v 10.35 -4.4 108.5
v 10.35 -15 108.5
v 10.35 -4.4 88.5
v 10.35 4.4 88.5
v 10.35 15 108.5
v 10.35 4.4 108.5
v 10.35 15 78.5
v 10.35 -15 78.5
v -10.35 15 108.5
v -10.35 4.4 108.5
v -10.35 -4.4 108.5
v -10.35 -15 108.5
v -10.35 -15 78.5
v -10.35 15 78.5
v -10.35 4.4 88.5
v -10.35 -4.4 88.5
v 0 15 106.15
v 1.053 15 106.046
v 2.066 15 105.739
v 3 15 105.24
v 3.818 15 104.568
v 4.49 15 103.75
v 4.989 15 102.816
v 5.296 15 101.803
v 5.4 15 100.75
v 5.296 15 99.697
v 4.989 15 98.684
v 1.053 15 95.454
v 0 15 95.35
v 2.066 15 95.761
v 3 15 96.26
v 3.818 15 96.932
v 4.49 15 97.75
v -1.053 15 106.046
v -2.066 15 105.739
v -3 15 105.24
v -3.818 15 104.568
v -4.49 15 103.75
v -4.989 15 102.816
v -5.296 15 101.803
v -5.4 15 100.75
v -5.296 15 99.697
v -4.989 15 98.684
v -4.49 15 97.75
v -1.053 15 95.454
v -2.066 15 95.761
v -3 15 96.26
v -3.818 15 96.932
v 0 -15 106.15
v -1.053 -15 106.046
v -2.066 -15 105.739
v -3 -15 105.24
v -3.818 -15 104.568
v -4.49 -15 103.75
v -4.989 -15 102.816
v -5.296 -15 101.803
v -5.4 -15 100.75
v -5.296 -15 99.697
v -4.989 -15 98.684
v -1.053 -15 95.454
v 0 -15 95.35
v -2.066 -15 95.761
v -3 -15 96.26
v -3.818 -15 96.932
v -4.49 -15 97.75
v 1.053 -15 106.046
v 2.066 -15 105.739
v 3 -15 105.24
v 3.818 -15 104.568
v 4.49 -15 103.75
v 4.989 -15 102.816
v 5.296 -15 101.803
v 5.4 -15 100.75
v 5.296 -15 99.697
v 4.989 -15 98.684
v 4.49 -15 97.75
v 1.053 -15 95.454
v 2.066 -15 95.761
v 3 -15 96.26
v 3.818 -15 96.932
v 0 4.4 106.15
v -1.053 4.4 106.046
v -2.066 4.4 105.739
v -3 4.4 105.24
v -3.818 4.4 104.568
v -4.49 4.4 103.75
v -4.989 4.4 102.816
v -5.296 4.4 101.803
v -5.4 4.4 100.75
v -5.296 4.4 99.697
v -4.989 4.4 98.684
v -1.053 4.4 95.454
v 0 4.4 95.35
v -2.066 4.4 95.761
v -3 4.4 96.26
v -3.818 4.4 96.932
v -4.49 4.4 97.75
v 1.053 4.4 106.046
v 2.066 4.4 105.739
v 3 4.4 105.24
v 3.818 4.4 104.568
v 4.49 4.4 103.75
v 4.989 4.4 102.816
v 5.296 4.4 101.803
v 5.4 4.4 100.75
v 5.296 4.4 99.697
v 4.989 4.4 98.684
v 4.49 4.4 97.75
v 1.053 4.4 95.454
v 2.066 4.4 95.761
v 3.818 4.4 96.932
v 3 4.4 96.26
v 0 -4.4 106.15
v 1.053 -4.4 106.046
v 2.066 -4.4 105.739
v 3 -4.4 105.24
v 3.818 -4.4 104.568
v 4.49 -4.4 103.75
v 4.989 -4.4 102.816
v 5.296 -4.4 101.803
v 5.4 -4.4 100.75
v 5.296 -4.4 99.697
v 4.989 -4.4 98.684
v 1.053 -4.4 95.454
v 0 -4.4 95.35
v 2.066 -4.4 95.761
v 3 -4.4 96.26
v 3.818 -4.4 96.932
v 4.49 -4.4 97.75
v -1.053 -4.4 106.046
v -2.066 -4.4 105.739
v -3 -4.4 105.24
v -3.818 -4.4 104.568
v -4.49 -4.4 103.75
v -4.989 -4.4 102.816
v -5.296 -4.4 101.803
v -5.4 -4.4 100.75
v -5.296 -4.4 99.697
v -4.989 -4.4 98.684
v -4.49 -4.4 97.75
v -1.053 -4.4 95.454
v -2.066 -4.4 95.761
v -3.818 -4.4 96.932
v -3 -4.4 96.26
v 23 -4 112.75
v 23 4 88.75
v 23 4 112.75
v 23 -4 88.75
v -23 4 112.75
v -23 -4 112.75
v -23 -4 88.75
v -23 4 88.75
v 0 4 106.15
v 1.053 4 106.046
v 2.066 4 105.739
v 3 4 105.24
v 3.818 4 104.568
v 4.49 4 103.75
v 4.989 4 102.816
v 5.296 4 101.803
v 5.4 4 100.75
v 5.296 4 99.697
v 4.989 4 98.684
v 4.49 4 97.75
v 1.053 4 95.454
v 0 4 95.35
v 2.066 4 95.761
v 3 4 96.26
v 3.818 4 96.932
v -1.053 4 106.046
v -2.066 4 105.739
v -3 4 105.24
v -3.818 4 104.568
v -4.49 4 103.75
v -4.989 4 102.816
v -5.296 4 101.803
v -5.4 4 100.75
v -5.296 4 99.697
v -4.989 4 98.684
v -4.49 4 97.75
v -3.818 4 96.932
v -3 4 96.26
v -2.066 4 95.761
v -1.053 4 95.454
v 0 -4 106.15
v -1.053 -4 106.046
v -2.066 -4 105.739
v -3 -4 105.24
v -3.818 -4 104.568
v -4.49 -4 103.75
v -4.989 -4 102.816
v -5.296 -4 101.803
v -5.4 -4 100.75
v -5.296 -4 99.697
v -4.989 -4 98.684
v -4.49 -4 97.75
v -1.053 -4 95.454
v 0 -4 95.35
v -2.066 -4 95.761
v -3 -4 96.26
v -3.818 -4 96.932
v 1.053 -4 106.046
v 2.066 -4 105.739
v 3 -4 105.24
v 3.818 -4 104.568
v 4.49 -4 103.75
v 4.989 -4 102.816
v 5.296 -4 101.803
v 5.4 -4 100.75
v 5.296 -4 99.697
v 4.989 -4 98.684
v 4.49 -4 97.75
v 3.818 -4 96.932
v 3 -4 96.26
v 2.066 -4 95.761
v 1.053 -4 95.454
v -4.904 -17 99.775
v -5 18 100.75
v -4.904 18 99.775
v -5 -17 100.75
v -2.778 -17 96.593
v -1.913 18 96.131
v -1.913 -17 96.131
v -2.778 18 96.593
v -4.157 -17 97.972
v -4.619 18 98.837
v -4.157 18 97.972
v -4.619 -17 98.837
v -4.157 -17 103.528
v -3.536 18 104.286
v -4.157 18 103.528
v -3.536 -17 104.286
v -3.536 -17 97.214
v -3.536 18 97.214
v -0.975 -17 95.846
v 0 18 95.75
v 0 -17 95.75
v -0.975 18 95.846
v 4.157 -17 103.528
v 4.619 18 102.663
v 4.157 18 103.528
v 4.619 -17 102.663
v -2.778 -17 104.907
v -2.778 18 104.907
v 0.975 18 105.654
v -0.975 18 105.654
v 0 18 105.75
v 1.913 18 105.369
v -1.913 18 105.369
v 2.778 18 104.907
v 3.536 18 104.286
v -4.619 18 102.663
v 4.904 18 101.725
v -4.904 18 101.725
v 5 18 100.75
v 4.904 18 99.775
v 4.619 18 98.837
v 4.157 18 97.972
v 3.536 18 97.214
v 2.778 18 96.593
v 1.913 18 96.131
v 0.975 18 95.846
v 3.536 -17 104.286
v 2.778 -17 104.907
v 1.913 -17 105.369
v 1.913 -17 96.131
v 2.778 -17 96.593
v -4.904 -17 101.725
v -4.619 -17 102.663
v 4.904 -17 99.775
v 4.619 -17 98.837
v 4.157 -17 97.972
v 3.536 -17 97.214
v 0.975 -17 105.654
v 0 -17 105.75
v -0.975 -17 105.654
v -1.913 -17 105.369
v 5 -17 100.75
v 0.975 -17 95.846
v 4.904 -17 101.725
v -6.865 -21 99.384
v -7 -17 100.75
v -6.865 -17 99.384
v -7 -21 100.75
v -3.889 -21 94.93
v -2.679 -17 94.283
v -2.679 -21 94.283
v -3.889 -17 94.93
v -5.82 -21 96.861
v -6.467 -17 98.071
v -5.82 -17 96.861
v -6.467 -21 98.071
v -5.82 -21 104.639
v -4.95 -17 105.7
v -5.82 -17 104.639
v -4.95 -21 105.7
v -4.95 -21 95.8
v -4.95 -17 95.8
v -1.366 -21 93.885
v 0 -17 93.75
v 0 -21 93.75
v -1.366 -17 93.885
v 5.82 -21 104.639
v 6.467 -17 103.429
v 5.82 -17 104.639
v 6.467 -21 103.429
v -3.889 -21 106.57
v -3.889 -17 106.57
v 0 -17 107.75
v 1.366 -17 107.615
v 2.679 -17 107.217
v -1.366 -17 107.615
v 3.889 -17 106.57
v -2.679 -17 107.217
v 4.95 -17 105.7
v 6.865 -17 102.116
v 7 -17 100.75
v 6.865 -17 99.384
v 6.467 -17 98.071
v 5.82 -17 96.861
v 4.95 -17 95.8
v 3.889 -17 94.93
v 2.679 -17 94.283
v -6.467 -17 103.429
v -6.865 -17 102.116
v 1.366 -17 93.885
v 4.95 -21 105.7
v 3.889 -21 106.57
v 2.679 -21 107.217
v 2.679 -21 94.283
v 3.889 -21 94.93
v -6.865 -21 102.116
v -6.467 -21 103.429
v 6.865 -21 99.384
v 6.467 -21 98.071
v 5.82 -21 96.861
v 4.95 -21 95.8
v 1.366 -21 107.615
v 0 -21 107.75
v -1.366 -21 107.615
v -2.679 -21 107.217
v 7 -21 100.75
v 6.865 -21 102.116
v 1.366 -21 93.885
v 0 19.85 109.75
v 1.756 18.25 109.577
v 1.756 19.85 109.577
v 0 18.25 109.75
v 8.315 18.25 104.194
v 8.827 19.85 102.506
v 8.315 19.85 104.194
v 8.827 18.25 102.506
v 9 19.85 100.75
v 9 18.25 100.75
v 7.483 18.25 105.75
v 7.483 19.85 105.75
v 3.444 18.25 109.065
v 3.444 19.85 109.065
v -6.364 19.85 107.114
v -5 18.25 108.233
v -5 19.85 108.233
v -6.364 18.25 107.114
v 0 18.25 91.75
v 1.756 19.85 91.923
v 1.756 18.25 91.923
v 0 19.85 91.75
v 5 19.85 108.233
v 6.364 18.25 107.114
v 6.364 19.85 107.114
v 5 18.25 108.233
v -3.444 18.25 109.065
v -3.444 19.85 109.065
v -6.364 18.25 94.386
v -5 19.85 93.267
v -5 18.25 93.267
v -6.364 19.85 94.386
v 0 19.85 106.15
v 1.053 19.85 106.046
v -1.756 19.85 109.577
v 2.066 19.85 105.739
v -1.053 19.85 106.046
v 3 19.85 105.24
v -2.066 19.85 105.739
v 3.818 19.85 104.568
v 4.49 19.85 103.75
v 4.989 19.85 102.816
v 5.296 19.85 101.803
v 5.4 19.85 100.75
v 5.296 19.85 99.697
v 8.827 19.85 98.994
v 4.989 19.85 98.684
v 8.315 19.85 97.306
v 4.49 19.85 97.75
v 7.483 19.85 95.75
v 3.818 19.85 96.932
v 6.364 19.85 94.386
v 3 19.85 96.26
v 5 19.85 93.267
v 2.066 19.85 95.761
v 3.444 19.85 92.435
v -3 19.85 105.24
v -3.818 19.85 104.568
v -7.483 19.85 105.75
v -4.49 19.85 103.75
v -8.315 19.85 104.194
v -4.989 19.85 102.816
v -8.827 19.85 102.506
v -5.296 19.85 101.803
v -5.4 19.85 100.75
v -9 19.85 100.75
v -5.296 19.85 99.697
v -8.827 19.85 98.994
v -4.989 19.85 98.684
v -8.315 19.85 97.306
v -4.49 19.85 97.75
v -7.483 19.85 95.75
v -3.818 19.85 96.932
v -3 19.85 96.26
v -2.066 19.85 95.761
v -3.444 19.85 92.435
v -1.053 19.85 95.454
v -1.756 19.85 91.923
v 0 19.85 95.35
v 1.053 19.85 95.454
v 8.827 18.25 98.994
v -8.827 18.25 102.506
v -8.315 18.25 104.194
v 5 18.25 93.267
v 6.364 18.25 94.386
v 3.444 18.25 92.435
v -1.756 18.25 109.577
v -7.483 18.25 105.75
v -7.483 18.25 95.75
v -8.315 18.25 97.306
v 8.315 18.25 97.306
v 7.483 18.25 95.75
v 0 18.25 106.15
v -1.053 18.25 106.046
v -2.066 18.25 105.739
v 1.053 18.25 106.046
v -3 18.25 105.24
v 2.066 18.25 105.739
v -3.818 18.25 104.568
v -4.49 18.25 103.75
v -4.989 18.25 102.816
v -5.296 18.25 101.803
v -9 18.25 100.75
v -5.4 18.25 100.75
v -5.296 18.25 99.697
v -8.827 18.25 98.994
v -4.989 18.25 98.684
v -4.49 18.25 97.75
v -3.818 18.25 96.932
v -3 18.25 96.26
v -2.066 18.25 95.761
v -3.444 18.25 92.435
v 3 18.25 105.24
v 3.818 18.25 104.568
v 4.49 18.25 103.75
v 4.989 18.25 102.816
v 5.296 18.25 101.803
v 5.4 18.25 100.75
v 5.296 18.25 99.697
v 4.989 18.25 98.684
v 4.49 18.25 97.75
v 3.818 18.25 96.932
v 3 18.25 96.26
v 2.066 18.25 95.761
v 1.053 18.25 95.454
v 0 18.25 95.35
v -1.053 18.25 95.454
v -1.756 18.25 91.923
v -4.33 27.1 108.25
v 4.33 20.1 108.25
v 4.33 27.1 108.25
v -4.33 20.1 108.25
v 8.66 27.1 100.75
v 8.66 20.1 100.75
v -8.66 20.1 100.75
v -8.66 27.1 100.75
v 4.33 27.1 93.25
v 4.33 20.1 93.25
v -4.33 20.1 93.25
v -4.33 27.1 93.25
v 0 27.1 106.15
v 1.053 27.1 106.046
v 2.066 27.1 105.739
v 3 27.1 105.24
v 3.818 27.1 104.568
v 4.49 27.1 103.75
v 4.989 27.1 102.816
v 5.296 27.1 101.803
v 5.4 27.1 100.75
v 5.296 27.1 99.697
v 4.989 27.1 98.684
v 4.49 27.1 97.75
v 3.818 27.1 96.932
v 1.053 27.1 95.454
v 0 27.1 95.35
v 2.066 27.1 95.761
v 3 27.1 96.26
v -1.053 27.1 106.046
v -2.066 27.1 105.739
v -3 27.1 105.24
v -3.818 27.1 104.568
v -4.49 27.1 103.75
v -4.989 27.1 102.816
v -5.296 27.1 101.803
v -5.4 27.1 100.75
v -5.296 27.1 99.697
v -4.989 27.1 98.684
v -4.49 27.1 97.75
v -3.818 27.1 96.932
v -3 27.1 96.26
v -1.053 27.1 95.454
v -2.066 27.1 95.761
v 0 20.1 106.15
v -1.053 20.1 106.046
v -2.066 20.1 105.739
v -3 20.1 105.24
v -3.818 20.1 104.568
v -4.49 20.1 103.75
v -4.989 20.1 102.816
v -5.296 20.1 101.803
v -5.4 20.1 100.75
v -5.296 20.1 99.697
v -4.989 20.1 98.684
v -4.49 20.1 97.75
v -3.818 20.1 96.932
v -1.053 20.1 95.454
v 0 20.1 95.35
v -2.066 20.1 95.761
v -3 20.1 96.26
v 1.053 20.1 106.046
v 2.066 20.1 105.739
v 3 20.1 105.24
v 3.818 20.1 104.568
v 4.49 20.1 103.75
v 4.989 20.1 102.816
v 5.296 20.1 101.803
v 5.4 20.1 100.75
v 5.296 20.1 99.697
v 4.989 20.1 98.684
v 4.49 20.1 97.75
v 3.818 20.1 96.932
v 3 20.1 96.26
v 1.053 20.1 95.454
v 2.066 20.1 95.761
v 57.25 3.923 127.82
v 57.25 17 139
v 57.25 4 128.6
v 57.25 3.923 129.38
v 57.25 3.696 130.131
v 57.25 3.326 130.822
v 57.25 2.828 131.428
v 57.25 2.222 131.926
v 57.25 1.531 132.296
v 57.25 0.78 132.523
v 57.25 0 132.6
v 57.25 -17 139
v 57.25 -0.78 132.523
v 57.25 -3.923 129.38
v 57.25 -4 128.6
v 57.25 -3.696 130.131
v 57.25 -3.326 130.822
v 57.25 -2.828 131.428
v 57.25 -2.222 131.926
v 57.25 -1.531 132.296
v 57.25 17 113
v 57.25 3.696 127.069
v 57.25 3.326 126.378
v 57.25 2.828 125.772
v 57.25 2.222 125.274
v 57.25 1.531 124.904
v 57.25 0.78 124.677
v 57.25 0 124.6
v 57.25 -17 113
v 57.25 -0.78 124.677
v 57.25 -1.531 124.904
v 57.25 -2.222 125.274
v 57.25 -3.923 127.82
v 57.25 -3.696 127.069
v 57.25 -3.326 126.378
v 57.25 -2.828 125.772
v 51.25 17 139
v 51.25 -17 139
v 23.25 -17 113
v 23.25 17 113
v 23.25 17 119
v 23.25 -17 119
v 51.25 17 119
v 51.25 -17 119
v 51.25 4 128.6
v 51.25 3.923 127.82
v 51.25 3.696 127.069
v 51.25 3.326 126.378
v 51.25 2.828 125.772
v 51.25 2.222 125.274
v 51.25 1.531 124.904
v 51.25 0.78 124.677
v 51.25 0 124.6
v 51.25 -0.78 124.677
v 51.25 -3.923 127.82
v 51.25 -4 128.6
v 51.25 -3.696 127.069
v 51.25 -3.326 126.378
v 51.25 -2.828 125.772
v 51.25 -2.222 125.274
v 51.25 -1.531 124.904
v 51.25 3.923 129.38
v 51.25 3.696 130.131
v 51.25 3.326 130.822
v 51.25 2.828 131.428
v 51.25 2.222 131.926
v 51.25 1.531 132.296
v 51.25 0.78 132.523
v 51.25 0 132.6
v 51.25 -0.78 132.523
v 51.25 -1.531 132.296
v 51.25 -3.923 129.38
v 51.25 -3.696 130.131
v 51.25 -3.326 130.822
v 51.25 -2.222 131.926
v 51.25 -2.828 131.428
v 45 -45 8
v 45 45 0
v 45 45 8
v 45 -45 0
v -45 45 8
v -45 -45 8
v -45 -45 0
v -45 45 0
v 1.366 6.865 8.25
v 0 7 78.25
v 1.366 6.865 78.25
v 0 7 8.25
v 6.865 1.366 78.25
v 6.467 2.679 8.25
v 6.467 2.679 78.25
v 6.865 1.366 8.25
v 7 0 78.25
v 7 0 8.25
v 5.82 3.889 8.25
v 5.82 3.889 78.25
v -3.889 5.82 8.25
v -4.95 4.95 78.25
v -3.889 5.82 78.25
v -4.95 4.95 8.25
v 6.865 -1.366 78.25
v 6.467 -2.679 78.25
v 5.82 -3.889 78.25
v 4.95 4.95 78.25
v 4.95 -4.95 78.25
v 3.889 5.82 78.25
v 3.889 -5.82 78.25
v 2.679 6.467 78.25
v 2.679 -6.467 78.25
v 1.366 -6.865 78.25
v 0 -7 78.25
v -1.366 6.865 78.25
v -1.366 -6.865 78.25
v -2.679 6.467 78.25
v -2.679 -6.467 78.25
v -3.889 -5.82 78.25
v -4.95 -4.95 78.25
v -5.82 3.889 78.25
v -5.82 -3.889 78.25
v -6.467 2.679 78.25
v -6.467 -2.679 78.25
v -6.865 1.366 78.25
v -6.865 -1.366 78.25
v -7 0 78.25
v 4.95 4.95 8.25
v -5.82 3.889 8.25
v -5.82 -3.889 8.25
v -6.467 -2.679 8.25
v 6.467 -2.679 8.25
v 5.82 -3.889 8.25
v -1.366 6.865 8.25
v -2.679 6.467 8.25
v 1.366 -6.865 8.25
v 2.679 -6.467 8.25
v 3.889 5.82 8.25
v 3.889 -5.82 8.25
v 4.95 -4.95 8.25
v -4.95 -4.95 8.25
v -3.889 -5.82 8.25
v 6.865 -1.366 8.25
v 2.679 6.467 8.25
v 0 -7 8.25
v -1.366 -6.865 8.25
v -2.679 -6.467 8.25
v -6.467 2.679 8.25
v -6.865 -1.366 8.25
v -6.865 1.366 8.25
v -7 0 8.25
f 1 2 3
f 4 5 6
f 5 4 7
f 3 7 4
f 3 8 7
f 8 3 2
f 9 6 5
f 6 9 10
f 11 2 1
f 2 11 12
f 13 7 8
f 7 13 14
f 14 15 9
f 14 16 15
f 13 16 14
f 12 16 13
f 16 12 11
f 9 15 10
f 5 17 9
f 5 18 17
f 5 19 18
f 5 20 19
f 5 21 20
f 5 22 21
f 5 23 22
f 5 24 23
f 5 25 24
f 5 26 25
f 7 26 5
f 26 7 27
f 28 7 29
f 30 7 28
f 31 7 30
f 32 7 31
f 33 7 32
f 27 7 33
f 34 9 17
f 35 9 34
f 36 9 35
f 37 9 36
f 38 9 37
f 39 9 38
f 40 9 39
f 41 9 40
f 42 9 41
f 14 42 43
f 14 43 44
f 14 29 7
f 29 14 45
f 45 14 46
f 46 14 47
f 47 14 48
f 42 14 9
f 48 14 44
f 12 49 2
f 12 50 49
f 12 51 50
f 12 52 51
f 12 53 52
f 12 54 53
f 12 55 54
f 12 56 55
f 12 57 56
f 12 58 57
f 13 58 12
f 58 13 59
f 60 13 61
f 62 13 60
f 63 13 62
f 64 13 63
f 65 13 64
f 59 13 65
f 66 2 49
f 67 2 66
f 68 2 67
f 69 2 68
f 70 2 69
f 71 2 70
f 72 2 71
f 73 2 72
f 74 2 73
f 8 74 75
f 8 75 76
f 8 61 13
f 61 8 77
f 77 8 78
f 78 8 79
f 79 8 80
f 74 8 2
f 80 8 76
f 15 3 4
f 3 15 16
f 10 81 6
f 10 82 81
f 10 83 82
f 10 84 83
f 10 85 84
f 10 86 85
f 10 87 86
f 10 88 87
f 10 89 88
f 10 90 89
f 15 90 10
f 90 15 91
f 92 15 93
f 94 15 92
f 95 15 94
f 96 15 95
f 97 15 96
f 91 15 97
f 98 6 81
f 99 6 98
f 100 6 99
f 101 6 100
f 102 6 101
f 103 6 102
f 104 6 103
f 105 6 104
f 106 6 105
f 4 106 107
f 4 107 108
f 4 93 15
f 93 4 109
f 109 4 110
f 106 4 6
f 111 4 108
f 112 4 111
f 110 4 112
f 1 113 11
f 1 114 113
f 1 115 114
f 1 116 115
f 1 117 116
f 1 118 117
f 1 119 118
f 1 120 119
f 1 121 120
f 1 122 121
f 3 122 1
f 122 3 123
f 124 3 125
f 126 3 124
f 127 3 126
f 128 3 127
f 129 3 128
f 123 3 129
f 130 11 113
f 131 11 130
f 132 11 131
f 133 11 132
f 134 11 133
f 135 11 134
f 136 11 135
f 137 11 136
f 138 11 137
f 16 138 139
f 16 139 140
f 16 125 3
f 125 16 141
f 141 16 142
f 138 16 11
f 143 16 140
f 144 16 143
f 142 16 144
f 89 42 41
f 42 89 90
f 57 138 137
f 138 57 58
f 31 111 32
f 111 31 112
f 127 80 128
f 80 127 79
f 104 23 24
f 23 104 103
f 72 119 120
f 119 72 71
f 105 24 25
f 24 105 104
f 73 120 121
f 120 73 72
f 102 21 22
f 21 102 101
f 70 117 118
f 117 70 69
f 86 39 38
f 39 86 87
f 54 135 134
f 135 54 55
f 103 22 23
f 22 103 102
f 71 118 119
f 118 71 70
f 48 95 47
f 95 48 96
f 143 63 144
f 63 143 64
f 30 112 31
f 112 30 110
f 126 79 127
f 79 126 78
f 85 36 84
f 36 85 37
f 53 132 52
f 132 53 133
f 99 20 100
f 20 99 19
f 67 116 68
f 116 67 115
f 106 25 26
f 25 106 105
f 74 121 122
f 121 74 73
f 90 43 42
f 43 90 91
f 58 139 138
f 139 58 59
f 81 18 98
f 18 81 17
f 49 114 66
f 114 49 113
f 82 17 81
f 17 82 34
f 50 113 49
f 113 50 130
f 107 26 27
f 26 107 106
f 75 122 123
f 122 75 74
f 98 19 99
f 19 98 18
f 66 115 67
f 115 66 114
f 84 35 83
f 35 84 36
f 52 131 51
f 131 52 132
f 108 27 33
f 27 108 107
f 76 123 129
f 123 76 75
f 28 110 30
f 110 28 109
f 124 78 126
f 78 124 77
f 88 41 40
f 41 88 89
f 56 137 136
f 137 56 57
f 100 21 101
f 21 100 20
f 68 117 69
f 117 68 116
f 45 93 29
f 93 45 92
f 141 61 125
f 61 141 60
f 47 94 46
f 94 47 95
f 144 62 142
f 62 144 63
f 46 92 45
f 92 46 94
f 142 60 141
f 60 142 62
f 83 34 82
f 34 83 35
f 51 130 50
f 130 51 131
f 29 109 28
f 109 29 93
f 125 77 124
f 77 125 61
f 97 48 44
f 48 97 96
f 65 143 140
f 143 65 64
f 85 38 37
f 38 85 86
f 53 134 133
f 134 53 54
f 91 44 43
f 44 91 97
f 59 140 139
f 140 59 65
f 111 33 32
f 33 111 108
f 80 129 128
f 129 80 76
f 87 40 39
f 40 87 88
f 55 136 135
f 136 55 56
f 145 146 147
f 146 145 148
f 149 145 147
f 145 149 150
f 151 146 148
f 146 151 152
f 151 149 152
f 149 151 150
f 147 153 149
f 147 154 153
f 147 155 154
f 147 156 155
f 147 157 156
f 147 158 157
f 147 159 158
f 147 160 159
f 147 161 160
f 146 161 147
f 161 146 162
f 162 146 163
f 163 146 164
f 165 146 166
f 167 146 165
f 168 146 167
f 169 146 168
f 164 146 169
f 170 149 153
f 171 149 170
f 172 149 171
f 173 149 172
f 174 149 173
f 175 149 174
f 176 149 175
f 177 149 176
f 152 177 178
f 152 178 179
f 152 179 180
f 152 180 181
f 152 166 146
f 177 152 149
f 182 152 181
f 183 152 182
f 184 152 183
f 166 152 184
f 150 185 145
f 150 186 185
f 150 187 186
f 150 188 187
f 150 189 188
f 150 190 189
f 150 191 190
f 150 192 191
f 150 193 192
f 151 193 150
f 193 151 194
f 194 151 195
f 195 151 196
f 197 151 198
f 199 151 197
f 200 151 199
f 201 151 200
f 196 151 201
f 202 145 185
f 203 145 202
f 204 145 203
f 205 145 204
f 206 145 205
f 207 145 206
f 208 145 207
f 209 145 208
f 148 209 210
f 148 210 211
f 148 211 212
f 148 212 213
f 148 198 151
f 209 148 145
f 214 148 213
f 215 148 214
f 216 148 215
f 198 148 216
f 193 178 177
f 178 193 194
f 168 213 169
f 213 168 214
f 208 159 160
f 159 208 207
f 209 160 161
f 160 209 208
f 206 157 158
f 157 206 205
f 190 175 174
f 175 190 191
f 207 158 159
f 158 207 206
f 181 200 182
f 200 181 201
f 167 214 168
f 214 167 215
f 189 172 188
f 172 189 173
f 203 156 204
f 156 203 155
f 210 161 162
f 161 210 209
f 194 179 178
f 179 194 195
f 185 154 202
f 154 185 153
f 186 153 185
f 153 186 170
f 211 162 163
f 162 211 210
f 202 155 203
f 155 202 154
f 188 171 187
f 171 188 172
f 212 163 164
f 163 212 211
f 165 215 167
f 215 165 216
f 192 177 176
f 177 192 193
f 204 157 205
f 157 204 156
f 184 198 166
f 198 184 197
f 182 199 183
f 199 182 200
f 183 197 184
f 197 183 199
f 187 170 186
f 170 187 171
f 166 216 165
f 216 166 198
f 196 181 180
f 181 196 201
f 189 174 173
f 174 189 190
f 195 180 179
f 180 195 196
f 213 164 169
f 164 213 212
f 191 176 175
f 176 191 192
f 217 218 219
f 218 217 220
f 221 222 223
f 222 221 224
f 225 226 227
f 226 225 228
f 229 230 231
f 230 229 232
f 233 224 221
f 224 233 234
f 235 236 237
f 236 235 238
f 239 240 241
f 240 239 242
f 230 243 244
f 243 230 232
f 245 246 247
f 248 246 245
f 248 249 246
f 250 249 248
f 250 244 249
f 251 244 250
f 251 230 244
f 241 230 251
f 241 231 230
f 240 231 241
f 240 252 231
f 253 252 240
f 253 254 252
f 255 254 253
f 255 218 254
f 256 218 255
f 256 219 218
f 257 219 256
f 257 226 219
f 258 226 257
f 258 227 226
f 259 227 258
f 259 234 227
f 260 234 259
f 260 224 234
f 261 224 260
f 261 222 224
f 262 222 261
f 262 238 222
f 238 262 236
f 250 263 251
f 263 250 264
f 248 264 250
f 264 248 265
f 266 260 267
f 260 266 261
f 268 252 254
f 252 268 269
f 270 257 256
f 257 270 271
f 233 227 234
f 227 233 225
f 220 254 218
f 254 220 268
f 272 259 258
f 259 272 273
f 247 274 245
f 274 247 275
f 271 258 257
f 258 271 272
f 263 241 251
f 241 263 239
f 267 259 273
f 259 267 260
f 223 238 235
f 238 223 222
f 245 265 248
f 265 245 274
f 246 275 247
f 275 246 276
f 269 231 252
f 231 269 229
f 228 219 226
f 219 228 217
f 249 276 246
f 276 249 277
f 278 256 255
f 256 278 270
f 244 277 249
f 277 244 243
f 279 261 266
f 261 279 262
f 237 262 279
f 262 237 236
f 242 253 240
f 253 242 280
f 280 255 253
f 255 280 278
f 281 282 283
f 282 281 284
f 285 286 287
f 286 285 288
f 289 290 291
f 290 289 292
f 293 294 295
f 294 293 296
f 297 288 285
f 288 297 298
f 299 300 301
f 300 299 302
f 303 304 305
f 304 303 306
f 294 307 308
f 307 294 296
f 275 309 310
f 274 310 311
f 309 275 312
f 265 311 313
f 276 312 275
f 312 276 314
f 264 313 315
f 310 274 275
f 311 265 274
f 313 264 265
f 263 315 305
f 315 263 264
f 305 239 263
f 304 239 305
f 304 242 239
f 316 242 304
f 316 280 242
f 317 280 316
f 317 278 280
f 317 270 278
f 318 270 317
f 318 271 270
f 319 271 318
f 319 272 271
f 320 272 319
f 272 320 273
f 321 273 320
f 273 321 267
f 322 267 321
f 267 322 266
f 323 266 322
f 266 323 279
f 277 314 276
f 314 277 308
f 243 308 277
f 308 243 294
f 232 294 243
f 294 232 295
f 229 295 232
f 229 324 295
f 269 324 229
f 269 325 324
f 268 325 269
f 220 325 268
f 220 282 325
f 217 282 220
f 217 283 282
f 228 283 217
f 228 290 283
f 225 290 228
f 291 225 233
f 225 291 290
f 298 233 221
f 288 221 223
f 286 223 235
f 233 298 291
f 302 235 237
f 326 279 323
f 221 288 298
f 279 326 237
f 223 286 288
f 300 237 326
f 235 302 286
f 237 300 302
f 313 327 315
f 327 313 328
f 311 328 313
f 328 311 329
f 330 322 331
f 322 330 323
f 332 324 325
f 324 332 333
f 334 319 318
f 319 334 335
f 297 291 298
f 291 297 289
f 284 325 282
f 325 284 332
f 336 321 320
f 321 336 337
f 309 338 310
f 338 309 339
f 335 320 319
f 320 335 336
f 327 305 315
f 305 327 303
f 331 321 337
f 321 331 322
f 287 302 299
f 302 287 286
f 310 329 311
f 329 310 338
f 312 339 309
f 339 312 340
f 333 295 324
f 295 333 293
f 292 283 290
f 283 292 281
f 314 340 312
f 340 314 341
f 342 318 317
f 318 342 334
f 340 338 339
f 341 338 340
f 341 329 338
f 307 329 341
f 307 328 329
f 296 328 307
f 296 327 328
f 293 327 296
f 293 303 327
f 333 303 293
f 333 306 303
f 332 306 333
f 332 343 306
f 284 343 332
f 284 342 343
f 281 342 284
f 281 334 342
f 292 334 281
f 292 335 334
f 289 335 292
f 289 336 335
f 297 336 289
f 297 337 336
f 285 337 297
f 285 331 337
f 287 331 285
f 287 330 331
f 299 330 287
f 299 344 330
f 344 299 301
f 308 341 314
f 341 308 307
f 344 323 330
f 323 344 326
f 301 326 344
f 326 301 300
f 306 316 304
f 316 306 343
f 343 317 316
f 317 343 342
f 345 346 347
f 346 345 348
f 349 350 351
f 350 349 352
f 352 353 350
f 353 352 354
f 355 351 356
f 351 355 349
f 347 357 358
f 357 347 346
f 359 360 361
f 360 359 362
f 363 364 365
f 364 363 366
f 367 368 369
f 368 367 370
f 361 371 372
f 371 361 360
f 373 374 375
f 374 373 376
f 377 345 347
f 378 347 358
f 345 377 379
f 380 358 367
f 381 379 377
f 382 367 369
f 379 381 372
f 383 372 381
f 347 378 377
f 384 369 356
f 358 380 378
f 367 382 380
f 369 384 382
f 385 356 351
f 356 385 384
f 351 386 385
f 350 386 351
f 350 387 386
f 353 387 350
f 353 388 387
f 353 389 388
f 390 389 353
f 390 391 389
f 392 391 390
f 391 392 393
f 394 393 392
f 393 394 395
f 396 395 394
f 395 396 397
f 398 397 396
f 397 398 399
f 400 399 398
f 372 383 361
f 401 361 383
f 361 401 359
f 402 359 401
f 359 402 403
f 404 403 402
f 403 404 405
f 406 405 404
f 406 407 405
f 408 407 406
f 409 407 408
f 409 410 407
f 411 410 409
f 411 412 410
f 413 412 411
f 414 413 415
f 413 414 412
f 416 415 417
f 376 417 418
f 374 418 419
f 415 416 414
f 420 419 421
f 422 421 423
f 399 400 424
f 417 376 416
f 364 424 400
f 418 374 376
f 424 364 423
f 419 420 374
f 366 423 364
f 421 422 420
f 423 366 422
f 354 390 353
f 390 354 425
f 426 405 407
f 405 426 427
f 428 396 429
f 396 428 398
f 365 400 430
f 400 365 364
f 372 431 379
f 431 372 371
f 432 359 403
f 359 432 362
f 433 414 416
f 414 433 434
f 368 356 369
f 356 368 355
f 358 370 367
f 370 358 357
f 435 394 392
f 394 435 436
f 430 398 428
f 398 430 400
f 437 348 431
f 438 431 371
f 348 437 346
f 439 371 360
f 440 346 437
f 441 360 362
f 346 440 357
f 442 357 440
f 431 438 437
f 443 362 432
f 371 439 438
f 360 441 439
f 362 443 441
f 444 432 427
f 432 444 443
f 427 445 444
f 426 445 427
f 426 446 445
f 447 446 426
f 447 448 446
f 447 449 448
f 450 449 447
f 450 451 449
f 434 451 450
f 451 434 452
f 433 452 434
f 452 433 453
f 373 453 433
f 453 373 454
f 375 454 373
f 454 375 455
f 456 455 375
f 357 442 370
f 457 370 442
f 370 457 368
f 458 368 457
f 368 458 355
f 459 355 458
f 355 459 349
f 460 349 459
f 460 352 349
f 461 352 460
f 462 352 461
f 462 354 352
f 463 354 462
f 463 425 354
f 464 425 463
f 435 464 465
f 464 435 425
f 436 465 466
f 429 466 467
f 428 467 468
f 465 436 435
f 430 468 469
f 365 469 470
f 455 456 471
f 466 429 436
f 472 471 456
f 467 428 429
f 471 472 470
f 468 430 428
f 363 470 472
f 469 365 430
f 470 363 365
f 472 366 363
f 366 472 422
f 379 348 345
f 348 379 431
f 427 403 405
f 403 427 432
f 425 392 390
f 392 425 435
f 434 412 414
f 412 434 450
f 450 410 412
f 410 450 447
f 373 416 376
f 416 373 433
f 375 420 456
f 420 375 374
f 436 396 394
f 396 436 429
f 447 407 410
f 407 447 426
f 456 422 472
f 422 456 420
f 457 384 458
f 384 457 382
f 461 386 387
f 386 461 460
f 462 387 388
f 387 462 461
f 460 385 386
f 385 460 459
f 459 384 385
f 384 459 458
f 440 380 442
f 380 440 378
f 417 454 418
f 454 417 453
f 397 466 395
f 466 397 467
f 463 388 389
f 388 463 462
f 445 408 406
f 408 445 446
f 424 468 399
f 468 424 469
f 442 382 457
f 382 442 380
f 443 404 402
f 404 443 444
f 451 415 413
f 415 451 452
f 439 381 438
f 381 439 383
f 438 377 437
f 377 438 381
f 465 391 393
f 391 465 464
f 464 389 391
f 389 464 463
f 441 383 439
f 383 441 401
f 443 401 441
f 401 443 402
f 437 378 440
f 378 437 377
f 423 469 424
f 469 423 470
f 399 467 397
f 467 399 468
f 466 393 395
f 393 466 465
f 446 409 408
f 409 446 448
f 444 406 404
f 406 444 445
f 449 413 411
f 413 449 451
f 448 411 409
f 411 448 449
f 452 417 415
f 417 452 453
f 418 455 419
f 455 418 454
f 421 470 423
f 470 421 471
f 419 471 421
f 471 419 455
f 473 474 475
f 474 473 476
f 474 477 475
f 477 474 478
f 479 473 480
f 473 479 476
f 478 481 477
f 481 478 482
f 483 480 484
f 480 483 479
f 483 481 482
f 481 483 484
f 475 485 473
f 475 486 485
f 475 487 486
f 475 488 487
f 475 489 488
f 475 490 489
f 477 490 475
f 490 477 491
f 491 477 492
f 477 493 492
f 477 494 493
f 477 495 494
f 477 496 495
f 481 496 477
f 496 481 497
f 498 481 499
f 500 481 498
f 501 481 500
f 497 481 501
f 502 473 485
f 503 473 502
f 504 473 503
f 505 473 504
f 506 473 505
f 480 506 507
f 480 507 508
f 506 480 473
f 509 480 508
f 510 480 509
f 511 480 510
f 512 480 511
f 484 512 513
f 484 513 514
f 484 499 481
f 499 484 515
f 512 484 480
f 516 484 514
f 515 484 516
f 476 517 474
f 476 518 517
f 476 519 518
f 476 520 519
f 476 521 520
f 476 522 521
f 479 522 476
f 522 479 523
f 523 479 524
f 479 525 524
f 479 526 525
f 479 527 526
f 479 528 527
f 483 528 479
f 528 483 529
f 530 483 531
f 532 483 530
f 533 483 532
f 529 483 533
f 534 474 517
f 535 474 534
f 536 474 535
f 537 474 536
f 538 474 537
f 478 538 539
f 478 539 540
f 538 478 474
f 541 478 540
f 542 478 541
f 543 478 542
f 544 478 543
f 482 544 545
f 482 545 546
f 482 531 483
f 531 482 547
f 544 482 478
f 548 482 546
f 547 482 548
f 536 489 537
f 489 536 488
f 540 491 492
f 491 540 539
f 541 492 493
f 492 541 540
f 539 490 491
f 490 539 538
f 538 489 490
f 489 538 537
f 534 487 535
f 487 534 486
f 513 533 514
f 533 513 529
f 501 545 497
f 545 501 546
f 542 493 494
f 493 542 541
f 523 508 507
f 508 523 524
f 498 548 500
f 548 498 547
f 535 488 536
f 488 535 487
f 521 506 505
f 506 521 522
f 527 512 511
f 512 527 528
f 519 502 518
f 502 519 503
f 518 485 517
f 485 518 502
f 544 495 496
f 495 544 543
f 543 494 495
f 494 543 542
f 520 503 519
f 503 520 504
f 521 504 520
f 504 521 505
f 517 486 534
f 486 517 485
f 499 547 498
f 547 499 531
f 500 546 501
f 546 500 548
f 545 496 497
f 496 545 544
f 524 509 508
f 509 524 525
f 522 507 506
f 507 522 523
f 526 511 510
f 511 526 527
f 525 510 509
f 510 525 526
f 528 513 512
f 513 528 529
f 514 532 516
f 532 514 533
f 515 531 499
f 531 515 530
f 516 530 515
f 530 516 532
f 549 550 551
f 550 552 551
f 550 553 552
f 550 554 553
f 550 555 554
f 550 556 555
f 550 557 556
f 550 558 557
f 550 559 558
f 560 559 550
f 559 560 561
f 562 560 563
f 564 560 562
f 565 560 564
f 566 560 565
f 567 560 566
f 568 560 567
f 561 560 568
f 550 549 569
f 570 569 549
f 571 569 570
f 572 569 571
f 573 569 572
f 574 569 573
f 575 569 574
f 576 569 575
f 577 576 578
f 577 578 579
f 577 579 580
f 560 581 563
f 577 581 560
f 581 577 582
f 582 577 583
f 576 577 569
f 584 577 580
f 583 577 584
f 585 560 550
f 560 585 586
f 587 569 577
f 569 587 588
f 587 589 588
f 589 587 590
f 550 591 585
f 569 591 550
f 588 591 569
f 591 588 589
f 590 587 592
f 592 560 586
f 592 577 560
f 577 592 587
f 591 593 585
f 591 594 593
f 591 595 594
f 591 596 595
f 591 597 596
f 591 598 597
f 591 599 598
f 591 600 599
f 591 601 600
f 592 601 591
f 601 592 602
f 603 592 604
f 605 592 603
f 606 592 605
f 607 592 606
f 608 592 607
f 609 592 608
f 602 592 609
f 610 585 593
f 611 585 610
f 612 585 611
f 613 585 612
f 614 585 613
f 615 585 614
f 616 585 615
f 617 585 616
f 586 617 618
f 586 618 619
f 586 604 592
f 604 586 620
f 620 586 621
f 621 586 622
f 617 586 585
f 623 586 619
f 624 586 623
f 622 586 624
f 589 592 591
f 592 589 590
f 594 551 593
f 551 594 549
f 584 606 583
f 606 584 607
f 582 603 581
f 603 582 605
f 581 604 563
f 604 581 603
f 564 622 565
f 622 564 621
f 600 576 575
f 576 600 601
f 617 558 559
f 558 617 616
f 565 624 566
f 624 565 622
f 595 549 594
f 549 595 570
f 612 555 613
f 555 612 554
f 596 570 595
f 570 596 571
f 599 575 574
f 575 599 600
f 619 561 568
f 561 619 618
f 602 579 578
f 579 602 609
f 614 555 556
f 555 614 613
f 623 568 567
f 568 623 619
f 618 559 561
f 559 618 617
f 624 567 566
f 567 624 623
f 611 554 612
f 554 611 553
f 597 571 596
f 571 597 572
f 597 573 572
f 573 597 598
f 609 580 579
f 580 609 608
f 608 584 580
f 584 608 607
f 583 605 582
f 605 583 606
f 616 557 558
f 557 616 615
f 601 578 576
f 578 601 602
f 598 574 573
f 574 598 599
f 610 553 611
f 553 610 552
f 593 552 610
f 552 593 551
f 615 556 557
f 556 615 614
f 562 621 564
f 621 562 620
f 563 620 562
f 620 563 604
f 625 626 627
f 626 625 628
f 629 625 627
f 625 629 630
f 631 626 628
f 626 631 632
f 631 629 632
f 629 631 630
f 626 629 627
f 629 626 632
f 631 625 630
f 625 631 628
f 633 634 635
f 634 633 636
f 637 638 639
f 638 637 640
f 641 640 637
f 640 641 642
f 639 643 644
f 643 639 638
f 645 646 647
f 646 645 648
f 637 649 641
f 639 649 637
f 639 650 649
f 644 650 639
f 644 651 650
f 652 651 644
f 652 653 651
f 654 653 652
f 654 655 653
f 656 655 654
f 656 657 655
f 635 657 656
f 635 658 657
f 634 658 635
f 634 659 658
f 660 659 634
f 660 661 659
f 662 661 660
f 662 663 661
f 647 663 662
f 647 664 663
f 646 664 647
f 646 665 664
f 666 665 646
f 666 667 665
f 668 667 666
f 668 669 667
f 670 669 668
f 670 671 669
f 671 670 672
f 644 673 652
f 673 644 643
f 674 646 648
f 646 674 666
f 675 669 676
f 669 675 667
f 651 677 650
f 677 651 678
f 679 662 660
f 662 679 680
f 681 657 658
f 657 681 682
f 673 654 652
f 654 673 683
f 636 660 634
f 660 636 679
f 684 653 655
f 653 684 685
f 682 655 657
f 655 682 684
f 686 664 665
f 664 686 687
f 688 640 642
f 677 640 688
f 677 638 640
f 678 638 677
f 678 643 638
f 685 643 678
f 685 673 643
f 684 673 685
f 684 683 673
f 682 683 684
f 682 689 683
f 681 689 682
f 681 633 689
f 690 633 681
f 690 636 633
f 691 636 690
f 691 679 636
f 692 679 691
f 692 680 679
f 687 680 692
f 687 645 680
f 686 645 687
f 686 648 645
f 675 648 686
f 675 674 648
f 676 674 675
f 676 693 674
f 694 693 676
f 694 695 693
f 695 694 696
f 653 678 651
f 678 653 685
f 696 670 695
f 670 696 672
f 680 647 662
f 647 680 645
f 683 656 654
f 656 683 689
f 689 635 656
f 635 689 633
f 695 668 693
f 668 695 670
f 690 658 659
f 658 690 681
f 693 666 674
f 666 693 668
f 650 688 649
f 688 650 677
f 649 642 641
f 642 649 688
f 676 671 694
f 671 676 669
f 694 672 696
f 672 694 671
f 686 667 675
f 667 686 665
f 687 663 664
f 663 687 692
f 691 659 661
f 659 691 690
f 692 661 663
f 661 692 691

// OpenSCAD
$fn = 32;

// ------------------------------------------------------------------------
// Lamp arm: column d14 x 70 mm, arm 46 mm
// Every part is its own module, assembly() places every instance.
// ------------------------------------------------------------------------

// --- part 1 ---
module lamp_base() {
  difference() {
    translate([-45, -45, 0]) cube([90, 90, 8]);
  }
}

// --- part 2 ---
module lamp_column() {
  cylinder(h = 70, d = 14);
}

// --- part 3 ---
module head_fork() {
  difference() {
    translate([-10.35, -15, 0]) cube([20.7, 30, 30]);
    translate([-11.35, -4.4, 10]) cube([22.7, 8.8, 21]);
    translate([0, 0, 22.25]) rotate([90, 0, 0]) cylinder(h = 32, d = 10.8, center = true);
  }
}

// --- part 4 ---
module lamp_arm() {
  difference() {
    translate([-23, -4, 0]) cube([46, 8, 24]);
    translate([0, 0, 12]) rotate([90, 0, 0]) cylinder(h = 10, d = 10.8, center = true);
  }
}

// --- part 5 ---
module arm_pin() {
  rotate([0, 90, 0]) cylinder(h = 36, d = 10, center = true);
  translate([-21, 0, 0]) rotate([0, 90, 0]) cylinder(h = 4, d = 14);
}

// --- part 6 ---
module arm_washer() {
  difference() {
      translate([0, 0, 0]) cylinder(h = 1.6, d = 18);
      translate([0, 0, -1]) cylinder(h = 3.6, d = 10.8);
    }
}

// --- part 7 ---
module arm_nut() {
  difference() {
    linear_extrude(height = 7) polygon(points = [[8.66, 0], [4.33, 7.5], [-4.33, 7.5], [-8.66, 0], [-4.33, -7.5], [4.33, -7.5]]);
    translate([0, 0, -1]) cylinder(h = 9, d = 10.8);
  }
}

// --- part 8 ---
module shade_bracket() {
  difference() {
    translate([-17, -17, 0]) cube([34, 34, 26]);
    translate([-18, -18, 6]) cube([29, 36, 21]);
    translate([14, 0, 15.6]) rotate([0, 90, 0]) cylinder(h = 8, d = 8, center = true);
  }
}

// --- assembly ---
module assembly() {
  color([0.80, 0.24, 0.20]) translate([0, 0, 0]) rotate([0, 0, 0]) lamp_base();
  color([0.20, 0.45, 0.75]) translate([0, 0, 8.25]) rotate([0, 0, 0]) lamp_column();
  color([0.25, 0.62, 0.32]) translate([0, 0, 78.5]) rotate([0, 0, 0]) head_fork();
  color([0.92, 0.70, 0.18]) translate([0, 0, 88.75]) rotate([0, 0, 0]) lamp_arm();
  color([0.58, 0.35, 0.70]) translate([0, 0, 100.75]) rotate([0, 0, 90]) arm_pin();
  color([0.16, 0.66, 0.66]) translate([0, 19.85, 100.75]) rotate([90, 0, 0]) arm_washer();
  color([0.85, 0.48, 0.18]) translate([0, 27.1, 100.75]) rotate([90, 0, 0]) arm_nut();
  color([0.55, 0.60, 0.65]) translate([40.25, 0, 113]) rotate([0, 0, 0]) shade_bracket();
}

assembly();
